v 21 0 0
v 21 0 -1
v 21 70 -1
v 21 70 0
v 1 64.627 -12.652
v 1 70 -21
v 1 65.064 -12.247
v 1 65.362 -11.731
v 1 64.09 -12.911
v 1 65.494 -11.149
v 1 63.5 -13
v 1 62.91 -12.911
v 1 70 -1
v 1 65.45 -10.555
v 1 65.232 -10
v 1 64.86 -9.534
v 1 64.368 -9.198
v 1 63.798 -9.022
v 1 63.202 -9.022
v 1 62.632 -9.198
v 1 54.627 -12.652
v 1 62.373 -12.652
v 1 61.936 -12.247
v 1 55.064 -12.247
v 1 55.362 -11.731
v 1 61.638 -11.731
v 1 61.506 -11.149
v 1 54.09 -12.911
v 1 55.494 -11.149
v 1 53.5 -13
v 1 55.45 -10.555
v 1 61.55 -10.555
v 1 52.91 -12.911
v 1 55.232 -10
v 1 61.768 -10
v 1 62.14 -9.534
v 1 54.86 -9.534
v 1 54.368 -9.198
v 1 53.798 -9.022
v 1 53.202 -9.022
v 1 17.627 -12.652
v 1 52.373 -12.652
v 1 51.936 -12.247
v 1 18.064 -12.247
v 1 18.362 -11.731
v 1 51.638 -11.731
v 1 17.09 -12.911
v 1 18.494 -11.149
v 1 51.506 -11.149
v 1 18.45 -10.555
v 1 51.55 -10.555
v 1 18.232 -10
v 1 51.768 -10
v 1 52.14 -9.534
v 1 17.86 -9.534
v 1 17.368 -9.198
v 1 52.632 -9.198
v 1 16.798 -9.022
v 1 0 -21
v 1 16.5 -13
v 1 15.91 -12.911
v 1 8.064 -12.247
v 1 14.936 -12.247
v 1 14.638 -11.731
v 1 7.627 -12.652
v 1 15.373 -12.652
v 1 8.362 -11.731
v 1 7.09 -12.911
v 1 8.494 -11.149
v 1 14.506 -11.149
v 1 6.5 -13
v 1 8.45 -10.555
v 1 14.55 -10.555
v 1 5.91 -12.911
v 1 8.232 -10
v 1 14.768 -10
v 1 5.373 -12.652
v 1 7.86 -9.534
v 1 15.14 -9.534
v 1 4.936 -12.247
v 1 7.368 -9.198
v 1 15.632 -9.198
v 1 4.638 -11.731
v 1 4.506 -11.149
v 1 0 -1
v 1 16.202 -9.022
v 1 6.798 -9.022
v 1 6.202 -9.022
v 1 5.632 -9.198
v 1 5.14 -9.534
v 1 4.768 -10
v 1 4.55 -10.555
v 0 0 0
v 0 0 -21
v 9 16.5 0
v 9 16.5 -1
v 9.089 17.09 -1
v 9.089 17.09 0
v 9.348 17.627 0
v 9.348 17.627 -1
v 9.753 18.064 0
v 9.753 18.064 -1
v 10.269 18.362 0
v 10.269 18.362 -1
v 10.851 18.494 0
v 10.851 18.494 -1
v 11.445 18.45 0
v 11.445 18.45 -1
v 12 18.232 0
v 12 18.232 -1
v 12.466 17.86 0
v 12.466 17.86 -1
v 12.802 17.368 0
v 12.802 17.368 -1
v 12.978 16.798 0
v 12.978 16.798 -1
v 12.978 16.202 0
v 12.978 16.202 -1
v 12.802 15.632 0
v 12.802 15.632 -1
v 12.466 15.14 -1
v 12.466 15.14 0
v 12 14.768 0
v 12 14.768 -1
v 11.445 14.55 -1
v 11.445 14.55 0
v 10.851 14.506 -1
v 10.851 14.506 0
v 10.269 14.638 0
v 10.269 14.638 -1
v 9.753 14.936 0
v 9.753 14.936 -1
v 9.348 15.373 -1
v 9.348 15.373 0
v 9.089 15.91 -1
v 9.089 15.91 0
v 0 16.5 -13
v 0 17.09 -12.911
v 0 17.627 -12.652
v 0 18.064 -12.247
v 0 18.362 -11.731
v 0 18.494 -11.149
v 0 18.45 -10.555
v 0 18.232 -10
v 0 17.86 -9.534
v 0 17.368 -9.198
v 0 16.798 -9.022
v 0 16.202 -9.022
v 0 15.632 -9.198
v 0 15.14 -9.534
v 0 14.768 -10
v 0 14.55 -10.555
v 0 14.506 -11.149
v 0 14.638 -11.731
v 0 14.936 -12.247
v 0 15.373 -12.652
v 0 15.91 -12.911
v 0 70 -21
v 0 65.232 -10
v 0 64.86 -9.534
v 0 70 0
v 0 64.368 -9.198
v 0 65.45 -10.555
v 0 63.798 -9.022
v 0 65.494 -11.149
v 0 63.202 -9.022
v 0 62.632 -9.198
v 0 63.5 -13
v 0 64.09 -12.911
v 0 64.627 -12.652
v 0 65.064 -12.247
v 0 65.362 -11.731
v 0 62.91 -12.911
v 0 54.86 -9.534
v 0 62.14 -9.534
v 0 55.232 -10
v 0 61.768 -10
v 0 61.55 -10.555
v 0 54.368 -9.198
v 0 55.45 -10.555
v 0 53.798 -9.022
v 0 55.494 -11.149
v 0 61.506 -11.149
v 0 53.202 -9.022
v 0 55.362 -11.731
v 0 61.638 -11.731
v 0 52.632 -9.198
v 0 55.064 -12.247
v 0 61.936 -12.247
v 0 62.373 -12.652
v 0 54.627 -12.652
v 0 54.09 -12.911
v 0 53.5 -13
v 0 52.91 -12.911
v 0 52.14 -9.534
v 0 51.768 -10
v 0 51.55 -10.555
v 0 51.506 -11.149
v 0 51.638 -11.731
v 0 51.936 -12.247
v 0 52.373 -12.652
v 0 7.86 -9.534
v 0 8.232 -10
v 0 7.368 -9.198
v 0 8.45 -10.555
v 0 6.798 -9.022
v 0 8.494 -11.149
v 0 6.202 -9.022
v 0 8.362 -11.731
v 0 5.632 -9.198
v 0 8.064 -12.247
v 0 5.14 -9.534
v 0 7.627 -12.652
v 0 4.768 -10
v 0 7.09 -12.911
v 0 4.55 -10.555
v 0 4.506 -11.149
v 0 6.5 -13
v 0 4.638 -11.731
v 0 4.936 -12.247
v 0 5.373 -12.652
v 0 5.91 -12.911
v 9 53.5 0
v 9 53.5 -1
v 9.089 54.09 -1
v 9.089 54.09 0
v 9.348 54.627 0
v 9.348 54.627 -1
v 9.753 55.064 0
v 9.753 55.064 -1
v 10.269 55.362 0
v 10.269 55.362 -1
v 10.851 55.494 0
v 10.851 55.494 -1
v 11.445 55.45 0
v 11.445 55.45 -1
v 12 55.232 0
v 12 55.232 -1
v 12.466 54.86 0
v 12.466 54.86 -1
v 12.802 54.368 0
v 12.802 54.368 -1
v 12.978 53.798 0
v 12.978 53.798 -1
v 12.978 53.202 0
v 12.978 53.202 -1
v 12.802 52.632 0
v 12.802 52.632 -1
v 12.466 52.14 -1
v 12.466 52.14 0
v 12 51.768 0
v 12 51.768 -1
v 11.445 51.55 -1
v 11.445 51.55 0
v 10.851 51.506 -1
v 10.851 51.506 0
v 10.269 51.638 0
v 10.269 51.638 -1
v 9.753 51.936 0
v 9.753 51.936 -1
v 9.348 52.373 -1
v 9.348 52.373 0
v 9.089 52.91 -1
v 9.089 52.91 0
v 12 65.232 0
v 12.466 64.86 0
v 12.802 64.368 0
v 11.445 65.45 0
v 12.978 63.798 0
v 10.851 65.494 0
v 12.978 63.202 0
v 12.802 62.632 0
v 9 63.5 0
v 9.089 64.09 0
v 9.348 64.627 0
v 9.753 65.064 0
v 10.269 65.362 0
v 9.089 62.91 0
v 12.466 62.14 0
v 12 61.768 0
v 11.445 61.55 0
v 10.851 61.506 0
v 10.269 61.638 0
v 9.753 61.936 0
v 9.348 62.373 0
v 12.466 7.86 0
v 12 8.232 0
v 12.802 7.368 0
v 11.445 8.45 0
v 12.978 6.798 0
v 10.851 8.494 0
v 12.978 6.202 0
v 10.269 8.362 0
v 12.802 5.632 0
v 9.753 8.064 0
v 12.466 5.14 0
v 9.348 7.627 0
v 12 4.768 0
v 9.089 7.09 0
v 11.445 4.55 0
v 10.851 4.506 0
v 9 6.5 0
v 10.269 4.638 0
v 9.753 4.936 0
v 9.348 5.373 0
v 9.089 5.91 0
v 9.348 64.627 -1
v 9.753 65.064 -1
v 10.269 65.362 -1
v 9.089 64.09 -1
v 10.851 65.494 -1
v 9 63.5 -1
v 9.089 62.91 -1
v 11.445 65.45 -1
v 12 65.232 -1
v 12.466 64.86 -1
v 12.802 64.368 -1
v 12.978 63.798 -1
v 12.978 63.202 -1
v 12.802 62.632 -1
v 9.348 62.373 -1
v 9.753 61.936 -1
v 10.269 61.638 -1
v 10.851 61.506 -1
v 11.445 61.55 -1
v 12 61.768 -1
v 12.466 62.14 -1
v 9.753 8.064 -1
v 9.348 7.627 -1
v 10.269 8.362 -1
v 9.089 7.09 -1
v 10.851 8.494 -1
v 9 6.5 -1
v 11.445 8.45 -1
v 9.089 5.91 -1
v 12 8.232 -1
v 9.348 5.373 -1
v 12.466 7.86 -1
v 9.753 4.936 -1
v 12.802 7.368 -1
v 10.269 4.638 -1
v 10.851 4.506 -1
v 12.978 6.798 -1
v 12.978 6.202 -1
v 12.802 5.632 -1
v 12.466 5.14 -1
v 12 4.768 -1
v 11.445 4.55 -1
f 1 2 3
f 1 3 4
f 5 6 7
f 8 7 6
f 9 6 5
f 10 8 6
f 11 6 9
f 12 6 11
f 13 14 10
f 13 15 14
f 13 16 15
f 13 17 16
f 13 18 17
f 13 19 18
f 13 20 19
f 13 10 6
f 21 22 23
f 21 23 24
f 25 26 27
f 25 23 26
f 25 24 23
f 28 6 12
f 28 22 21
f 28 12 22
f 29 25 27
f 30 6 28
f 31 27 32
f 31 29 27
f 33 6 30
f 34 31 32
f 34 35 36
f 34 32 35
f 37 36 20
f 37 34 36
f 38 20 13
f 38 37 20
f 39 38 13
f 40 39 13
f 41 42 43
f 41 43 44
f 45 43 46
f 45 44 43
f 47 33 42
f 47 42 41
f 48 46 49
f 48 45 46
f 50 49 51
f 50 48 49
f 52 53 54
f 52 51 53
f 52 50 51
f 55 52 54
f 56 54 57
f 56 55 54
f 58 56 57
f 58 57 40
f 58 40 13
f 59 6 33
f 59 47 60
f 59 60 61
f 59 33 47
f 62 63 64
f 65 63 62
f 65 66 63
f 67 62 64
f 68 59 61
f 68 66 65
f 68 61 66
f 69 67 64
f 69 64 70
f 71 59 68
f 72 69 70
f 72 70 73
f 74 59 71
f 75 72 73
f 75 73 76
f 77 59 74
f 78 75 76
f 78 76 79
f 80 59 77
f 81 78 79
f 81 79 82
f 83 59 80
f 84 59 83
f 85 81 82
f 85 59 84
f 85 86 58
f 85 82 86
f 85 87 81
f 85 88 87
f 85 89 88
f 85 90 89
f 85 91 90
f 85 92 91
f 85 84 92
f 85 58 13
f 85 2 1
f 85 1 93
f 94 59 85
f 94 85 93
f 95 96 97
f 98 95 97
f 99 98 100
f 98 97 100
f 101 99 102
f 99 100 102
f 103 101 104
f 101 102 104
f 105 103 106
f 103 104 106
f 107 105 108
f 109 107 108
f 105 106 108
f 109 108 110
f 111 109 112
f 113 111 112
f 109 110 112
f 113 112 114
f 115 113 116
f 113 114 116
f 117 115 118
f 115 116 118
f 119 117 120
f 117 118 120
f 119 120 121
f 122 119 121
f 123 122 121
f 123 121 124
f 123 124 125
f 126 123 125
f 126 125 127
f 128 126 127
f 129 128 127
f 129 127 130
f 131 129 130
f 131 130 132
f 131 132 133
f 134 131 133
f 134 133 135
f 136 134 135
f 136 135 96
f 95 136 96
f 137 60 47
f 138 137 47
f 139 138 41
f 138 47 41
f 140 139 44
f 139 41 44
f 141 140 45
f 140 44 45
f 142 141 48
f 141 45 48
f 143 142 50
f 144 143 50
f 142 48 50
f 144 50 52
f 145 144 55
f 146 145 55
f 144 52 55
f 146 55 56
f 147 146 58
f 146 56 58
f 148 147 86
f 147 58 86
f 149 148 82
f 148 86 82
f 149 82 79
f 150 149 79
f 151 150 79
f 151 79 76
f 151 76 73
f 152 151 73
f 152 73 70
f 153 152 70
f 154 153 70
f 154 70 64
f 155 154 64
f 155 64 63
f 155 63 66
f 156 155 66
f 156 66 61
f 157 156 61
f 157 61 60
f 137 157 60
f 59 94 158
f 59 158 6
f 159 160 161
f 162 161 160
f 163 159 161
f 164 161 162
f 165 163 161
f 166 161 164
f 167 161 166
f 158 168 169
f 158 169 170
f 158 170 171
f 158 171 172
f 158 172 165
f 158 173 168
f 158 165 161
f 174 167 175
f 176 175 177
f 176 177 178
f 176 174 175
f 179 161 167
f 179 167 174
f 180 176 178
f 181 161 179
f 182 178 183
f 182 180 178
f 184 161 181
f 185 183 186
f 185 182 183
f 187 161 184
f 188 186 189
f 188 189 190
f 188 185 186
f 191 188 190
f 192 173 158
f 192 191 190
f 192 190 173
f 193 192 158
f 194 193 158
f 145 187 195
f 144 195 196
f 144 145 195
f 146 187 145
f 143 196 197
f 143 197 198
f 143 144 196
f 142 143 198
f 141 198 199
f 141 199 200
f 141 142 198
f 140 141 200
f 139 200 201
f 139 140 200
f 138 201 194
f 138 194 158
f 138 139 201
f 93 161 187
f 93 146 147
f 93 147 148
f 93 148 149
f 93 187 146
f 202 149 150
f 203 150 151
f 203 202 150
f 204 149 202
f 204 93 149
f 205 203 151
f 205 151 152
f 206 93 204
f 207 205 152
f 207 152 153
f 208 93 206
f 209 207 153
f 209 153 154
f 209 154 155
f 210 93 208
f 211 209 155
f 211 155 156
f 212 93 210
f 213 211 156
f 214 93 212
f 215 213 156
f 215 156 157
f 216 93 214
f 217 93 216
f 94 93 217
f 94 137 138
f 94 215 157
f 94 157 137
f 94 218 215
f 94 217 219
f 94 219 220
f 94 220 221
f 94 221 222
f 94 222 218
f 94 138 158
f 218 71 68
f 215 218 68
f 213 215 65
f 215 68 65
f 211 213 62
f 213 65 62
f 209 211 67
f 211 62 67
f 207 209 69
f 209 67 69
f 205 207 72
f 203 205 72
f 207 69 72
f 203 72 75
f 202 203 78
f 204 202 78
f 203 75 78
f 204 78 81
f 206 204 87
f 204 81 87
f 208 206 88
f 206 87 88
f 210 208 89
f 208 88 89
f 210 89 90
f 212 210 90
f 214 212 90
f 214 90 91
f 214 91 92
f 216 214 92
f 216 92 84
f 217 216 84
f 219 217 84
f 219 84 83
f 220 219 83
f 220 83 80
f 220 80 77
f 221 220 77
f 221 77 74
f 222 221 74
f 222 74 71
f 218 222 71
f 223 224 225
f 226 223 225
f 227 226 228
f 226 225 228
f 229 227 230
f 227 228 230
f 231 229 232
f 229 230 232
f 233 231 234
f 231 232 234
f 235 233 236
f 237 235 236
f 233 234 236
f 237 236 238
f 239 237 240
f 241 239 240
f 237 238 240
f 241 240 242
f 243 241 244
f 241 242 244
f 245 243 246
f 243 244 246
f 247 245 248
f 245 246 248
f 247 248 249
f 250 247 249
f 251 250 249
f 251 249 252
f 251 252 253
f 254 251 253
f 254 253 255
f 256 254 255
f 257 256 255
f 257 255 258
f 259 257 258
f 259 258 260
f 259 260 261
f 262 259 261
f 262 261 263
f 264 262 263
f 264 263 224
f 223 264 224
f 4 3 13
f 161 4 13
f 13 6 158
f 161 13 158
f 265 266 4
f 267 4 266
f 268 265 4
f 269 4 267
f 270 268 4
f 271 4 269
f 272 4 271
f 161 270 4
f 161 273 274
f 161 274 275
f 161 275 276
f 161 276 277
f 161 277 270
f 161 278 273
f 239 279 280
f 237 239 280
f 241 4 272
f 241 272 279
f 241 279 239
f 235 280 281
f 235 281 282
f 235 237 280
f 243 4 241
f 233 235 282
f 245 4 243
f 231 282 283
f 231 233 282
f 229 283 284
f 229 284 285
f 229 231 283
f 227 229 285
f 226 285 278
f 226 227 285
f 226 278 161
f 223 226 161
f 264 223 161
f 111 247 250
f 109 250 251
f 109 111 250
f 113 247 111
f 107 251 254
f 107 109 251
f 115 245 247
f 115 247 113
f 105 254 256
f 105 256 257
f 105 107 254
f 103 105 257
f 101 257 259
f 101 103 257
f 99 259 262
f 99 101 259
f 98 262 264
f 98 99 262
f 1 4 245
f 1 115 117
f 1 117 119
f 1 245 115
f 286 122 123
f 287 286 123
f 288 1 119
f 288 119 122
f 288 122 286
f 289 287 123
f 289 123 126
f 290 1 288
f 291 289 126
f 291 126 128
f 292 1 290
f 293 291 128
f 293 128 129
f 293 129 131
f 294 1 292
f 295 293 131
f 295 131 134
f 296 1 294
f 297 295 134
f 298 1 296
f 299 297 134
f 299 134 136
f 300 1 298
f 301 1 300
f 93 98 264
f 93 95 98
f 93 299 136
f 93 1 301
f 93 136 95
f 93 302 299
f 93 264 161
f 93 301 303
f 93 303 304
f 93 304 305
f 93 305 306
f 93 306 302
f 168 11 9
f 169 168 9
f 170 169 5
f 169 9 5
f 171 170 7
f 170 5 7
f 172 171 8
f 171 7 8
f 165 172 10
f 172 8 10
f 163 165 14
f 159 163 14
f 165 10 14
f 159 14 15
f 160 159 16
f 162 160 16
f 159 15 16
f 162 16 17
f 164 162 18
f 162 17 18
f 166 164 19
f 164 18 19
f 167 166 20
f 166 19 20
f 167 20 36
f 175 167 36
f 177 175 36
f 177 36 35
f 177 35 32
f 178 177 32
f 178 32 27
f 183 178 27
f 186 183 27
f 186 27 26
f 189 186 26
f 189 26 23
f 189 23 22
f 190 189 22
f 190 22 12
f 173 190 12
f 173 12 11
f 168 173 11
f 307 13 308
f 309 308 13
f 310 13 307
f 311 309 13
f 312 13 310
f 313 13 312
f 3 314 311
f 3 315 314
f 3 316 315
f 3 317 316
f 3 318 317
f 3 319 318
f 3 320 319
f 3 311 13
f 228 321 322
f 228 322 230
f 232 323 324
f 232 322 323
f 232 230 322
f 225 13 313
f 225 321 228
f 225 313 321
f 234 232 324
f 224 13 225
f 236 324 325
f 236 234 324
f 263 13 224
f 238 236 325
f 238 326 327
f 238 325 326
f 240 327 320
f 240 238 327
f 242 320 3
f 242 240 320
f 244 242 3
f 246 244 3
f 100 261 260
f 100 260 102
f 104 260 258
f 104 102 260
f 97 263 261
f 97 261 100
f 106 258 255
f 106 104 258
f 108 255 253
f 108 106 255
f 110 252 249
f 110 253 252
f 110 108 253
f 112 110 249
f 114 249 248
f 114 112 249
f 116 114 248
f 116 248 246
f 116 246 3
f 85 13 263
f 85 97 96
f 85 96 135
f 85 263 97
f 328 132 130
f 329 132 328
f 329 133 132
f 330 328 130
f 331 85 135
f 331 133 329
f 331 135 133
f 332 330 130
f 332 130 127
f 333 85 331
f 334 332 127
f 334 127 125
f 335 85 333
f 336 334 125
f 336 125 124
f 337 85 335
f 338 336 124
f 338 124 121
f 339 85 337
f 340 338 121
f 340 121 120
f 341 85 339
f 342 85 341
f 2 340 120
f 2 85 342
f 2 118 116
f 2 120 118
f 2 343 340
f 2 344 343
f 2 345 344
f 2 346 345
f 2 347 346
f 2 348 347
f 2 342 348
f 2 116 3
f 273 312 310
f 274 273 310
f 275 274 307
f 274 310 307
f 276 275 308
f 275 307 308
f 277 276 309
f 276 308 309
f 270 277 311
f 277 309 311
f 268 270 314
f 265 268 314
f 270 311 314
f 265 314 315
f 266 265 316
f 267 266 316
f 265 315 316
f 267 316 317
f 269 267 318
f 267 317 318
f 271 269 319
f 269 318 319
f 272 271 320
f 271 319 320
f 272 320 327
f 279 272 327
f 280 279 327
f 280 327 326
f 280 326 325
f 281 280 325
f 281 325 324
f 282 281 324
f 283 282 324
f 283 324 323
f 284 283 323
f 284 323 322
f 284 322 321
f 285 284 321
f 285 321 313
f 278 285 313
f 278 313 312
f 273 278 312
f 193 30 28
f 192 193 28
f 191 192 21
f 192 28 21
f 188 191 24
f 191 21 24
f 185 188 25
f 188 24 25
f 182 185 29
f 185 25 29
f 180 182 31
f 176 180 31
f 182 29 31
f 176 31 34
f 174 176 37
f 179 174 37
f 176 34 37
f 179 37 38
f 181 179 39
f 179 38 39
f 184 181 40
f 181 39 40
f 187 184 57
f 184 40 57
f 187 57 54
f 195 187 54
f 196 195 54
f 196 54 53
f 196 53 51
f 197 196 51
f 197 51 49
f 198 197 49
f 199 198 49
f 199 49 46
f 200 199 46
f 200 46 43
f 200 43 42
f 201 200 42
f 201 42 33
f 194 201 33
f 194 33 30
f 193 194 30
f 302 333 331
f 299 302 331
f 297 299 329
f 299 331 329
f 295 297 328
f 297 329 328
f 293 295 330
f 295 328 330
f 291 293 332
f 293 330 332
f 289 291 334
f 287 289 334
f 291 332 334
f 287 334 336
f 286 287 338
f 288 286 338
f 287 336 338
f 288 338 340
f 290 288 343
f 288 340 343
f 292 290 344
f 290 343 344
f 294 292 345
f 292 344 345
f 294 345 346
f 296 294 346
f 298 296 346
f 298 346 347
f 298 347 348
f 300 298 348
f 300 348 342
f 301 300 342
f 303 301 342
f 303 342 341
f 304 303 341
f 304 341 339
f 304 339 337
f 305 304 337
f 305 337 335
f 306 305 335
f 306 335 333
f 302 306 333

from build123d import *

# Parameters (mm, degrees)
EXTRUSION1_DEPTH = 70
EXTRUSION2_REACH = 3
ESQUISSE2_R      = 2
EXTRUSION3_REACH = 3
ESQUISSE3_R      = 2


with BuildPart() as part:
    # Esquisse1 → Extrusion1 (new body)
    with BuildSketch(Plane(origin=(0, 0, 0), x_dir=(1, 0, 0), z_dir=(0, 1, 0))):
        Polygon((0, 0), (0, 21), (1, 21), (1, 1), (21, 1), (21, 0), align=None)
    extrude(amount=EXTRUSION1_DEPTH)

    # Esquisse2 → Extrusion2 (cut, up to next)
    with BuildSketch(Plane(origin=(1, 0, 0), x_dir=(0, 0, -1), z_dir=(1, 0, 0)), mode=Mode.PRIVATE) as extrusion2_sk1:
        with Locations((11, 16.5)):
            Circle(ESQUISSE2_R)
    extrusion2_tool1 = extrude(extrusion2_sk1.sketch, amount=-EXTRUSION2_REACH, mode=Mode.PRIVATE) & part.part
    add(extrusion2_tool1.solids().sort_by_distance((1, 16.5, -11))[0], mode=Mode.SUBTRACT)
    # Esquisse2 → Extrusion2 (cut, up to next)
    with BuildSketch(Plane(origin=(1, 0, 0), x_dir=(0, 0, -1), z_dir=(1, 0, 0)), mode=Mode.PRIVATE) as extrusion2_sk2:
        with Locations((11, 6.5)):
            Circle(ESQUISSE2_R)
    extrusion2_tool2 = extrude(extrusion2_sk2.sketch, amount=-EXTRUSION2_REACH, mode=Mode.PRIVATE) & part.part
    add(extrusion2_tool2.solids().sort_by_distance((1, 6.5, -11))[0], mode=Mode.SUBTRACT)
    # Esquisse2 → Extrusion2 (cut, up to next)
    with BuildSketch(Plane(origin=(1, 0, 0), x_dir=(0, 0, -1), z_dir=(1, 0, 0)), mode=Mode.PRIVATE) as extrusion2_sk3:
        with Locations((11, 53.5)):
            Circle(ESQUISSE2_R)
    extrusion2_tool3 = extrude(extrusion2_sk3.sketch, amount=-EXTRUSION2_REACH, mode=Mode.PRIVATE) & part.part
    add(extrusion2_tool3.solids().sort_by_distance((1, 53.5, -11))[0], mode=Mode.SUBTRACT)
    # Esquisse2 → Extrusion2 (cut, up to next)
    with BuildSketch(Plane(origin=(1, 0, 0), x_dir=(0, 0, -1), z_dir=(1, 0, 0)), mode=Mode.PRIVATE) as extrusion2_sk4:
        with Locations((11, 63.5)):
            Circle(ESQUISSE2_R)
    extrusion2_tool4 = extrude(extrusion2_sk4.sketch, amount=-EXTRUSION2_REACH, mode=Mode.PRIVATE) & part.part
    add(extrusion2_tool4.solids().sort_by_distance((1, 63.5, -11))[0], mode=Mode.SUBTRACT)

    # Esquisse3 → Extrusion3 (cut, up to next)
    with BuildSketch(Plane(origin=(0, 0, -1), x_dir=(-1, 0, 0), z_dir=(0, 0, -1)), mode=Mode.PRIVATE) as extrusion3_sk1:
        with Locations((-11, 53.5)):
            Circle(ESQUISSE3_R)
    extrusion3_tool1 = extrude(extrusion3_sk1.sketch, amount=-EXTRUSION3_REACH, mode=Mode.PRIVATE) & part.part
    add(extrusion3_tool1.solids().sort_by_distance((11, 53.5, -1))[0], mode=Mode.SUBTRACT)
    # Esquisse3 → Extrusion3 (cut, up to next)
    with BuildSketch(Plane(origin=(0, 0, -1), x_dir=(-1, 0, 0), z_dir=(0, 0, -1)), mode=Mode.PRIVATE) as extrusion3_sk2:
        with Locations((-11, 63.5)):
            Circle(ESQUISSE3_R)
    extrusion3_tool2 = extrude(extrusion3_sk2.sketch, amount=-EXTRUSION3_REACH, mode=Mode.PRIVATE) & part.part
    add(extrusion3_tool2.solids().sort_by_distance((11, 63.5, -1))[0], mode=Mode.SUBTRACT)
    # Esquisse3 → Extrusion3 (cut, up to next)
    with BuildSketch(Plane(origin=(0, 0, -1), x_dir=(-1, 0, 0), z_dir=(0, 0, -1)), mode=Mode.PRIVATE) as extrusion3_sk3:
        with Locations((-11, 6.5)):
            Circle(ESQUISSE3_R)
    extrusion3_tool3 = extrude(extrusion3_sk3.sketch, amount=-EXTRUSION3_REACH, mode=Mode.PRIVATE) & part.part
    add(extrusion3_tool3.solids().sort_by_distance((11, 6.5, -1))[0], mode=Mode.SUBTRACT)
    # Esquisse3 → Extrusion3 (cut, up to next)
    with BuildSketch(Plane(origin=(0, 0, -1), x_dir=(-1, 0, 0), z_dir=(0, 0, -1)), mode=Mode.PRIVATE) as extrusion3_sk4:
        with Locations((-11, 16.5)):
            Circle(ESQUISSE3_R)
    extrusion3_tool4 = extrude(extrusion3_sk4.sketch, amount=-EXTRUSION3_REACH, mode=Mode.PRIVATE) & part.part
    add(extrusion3_tool4.solids().sort_by_distance((11, 16.5, -1))[0], mode=Mode.SUBTRACT)


solid = part.part
